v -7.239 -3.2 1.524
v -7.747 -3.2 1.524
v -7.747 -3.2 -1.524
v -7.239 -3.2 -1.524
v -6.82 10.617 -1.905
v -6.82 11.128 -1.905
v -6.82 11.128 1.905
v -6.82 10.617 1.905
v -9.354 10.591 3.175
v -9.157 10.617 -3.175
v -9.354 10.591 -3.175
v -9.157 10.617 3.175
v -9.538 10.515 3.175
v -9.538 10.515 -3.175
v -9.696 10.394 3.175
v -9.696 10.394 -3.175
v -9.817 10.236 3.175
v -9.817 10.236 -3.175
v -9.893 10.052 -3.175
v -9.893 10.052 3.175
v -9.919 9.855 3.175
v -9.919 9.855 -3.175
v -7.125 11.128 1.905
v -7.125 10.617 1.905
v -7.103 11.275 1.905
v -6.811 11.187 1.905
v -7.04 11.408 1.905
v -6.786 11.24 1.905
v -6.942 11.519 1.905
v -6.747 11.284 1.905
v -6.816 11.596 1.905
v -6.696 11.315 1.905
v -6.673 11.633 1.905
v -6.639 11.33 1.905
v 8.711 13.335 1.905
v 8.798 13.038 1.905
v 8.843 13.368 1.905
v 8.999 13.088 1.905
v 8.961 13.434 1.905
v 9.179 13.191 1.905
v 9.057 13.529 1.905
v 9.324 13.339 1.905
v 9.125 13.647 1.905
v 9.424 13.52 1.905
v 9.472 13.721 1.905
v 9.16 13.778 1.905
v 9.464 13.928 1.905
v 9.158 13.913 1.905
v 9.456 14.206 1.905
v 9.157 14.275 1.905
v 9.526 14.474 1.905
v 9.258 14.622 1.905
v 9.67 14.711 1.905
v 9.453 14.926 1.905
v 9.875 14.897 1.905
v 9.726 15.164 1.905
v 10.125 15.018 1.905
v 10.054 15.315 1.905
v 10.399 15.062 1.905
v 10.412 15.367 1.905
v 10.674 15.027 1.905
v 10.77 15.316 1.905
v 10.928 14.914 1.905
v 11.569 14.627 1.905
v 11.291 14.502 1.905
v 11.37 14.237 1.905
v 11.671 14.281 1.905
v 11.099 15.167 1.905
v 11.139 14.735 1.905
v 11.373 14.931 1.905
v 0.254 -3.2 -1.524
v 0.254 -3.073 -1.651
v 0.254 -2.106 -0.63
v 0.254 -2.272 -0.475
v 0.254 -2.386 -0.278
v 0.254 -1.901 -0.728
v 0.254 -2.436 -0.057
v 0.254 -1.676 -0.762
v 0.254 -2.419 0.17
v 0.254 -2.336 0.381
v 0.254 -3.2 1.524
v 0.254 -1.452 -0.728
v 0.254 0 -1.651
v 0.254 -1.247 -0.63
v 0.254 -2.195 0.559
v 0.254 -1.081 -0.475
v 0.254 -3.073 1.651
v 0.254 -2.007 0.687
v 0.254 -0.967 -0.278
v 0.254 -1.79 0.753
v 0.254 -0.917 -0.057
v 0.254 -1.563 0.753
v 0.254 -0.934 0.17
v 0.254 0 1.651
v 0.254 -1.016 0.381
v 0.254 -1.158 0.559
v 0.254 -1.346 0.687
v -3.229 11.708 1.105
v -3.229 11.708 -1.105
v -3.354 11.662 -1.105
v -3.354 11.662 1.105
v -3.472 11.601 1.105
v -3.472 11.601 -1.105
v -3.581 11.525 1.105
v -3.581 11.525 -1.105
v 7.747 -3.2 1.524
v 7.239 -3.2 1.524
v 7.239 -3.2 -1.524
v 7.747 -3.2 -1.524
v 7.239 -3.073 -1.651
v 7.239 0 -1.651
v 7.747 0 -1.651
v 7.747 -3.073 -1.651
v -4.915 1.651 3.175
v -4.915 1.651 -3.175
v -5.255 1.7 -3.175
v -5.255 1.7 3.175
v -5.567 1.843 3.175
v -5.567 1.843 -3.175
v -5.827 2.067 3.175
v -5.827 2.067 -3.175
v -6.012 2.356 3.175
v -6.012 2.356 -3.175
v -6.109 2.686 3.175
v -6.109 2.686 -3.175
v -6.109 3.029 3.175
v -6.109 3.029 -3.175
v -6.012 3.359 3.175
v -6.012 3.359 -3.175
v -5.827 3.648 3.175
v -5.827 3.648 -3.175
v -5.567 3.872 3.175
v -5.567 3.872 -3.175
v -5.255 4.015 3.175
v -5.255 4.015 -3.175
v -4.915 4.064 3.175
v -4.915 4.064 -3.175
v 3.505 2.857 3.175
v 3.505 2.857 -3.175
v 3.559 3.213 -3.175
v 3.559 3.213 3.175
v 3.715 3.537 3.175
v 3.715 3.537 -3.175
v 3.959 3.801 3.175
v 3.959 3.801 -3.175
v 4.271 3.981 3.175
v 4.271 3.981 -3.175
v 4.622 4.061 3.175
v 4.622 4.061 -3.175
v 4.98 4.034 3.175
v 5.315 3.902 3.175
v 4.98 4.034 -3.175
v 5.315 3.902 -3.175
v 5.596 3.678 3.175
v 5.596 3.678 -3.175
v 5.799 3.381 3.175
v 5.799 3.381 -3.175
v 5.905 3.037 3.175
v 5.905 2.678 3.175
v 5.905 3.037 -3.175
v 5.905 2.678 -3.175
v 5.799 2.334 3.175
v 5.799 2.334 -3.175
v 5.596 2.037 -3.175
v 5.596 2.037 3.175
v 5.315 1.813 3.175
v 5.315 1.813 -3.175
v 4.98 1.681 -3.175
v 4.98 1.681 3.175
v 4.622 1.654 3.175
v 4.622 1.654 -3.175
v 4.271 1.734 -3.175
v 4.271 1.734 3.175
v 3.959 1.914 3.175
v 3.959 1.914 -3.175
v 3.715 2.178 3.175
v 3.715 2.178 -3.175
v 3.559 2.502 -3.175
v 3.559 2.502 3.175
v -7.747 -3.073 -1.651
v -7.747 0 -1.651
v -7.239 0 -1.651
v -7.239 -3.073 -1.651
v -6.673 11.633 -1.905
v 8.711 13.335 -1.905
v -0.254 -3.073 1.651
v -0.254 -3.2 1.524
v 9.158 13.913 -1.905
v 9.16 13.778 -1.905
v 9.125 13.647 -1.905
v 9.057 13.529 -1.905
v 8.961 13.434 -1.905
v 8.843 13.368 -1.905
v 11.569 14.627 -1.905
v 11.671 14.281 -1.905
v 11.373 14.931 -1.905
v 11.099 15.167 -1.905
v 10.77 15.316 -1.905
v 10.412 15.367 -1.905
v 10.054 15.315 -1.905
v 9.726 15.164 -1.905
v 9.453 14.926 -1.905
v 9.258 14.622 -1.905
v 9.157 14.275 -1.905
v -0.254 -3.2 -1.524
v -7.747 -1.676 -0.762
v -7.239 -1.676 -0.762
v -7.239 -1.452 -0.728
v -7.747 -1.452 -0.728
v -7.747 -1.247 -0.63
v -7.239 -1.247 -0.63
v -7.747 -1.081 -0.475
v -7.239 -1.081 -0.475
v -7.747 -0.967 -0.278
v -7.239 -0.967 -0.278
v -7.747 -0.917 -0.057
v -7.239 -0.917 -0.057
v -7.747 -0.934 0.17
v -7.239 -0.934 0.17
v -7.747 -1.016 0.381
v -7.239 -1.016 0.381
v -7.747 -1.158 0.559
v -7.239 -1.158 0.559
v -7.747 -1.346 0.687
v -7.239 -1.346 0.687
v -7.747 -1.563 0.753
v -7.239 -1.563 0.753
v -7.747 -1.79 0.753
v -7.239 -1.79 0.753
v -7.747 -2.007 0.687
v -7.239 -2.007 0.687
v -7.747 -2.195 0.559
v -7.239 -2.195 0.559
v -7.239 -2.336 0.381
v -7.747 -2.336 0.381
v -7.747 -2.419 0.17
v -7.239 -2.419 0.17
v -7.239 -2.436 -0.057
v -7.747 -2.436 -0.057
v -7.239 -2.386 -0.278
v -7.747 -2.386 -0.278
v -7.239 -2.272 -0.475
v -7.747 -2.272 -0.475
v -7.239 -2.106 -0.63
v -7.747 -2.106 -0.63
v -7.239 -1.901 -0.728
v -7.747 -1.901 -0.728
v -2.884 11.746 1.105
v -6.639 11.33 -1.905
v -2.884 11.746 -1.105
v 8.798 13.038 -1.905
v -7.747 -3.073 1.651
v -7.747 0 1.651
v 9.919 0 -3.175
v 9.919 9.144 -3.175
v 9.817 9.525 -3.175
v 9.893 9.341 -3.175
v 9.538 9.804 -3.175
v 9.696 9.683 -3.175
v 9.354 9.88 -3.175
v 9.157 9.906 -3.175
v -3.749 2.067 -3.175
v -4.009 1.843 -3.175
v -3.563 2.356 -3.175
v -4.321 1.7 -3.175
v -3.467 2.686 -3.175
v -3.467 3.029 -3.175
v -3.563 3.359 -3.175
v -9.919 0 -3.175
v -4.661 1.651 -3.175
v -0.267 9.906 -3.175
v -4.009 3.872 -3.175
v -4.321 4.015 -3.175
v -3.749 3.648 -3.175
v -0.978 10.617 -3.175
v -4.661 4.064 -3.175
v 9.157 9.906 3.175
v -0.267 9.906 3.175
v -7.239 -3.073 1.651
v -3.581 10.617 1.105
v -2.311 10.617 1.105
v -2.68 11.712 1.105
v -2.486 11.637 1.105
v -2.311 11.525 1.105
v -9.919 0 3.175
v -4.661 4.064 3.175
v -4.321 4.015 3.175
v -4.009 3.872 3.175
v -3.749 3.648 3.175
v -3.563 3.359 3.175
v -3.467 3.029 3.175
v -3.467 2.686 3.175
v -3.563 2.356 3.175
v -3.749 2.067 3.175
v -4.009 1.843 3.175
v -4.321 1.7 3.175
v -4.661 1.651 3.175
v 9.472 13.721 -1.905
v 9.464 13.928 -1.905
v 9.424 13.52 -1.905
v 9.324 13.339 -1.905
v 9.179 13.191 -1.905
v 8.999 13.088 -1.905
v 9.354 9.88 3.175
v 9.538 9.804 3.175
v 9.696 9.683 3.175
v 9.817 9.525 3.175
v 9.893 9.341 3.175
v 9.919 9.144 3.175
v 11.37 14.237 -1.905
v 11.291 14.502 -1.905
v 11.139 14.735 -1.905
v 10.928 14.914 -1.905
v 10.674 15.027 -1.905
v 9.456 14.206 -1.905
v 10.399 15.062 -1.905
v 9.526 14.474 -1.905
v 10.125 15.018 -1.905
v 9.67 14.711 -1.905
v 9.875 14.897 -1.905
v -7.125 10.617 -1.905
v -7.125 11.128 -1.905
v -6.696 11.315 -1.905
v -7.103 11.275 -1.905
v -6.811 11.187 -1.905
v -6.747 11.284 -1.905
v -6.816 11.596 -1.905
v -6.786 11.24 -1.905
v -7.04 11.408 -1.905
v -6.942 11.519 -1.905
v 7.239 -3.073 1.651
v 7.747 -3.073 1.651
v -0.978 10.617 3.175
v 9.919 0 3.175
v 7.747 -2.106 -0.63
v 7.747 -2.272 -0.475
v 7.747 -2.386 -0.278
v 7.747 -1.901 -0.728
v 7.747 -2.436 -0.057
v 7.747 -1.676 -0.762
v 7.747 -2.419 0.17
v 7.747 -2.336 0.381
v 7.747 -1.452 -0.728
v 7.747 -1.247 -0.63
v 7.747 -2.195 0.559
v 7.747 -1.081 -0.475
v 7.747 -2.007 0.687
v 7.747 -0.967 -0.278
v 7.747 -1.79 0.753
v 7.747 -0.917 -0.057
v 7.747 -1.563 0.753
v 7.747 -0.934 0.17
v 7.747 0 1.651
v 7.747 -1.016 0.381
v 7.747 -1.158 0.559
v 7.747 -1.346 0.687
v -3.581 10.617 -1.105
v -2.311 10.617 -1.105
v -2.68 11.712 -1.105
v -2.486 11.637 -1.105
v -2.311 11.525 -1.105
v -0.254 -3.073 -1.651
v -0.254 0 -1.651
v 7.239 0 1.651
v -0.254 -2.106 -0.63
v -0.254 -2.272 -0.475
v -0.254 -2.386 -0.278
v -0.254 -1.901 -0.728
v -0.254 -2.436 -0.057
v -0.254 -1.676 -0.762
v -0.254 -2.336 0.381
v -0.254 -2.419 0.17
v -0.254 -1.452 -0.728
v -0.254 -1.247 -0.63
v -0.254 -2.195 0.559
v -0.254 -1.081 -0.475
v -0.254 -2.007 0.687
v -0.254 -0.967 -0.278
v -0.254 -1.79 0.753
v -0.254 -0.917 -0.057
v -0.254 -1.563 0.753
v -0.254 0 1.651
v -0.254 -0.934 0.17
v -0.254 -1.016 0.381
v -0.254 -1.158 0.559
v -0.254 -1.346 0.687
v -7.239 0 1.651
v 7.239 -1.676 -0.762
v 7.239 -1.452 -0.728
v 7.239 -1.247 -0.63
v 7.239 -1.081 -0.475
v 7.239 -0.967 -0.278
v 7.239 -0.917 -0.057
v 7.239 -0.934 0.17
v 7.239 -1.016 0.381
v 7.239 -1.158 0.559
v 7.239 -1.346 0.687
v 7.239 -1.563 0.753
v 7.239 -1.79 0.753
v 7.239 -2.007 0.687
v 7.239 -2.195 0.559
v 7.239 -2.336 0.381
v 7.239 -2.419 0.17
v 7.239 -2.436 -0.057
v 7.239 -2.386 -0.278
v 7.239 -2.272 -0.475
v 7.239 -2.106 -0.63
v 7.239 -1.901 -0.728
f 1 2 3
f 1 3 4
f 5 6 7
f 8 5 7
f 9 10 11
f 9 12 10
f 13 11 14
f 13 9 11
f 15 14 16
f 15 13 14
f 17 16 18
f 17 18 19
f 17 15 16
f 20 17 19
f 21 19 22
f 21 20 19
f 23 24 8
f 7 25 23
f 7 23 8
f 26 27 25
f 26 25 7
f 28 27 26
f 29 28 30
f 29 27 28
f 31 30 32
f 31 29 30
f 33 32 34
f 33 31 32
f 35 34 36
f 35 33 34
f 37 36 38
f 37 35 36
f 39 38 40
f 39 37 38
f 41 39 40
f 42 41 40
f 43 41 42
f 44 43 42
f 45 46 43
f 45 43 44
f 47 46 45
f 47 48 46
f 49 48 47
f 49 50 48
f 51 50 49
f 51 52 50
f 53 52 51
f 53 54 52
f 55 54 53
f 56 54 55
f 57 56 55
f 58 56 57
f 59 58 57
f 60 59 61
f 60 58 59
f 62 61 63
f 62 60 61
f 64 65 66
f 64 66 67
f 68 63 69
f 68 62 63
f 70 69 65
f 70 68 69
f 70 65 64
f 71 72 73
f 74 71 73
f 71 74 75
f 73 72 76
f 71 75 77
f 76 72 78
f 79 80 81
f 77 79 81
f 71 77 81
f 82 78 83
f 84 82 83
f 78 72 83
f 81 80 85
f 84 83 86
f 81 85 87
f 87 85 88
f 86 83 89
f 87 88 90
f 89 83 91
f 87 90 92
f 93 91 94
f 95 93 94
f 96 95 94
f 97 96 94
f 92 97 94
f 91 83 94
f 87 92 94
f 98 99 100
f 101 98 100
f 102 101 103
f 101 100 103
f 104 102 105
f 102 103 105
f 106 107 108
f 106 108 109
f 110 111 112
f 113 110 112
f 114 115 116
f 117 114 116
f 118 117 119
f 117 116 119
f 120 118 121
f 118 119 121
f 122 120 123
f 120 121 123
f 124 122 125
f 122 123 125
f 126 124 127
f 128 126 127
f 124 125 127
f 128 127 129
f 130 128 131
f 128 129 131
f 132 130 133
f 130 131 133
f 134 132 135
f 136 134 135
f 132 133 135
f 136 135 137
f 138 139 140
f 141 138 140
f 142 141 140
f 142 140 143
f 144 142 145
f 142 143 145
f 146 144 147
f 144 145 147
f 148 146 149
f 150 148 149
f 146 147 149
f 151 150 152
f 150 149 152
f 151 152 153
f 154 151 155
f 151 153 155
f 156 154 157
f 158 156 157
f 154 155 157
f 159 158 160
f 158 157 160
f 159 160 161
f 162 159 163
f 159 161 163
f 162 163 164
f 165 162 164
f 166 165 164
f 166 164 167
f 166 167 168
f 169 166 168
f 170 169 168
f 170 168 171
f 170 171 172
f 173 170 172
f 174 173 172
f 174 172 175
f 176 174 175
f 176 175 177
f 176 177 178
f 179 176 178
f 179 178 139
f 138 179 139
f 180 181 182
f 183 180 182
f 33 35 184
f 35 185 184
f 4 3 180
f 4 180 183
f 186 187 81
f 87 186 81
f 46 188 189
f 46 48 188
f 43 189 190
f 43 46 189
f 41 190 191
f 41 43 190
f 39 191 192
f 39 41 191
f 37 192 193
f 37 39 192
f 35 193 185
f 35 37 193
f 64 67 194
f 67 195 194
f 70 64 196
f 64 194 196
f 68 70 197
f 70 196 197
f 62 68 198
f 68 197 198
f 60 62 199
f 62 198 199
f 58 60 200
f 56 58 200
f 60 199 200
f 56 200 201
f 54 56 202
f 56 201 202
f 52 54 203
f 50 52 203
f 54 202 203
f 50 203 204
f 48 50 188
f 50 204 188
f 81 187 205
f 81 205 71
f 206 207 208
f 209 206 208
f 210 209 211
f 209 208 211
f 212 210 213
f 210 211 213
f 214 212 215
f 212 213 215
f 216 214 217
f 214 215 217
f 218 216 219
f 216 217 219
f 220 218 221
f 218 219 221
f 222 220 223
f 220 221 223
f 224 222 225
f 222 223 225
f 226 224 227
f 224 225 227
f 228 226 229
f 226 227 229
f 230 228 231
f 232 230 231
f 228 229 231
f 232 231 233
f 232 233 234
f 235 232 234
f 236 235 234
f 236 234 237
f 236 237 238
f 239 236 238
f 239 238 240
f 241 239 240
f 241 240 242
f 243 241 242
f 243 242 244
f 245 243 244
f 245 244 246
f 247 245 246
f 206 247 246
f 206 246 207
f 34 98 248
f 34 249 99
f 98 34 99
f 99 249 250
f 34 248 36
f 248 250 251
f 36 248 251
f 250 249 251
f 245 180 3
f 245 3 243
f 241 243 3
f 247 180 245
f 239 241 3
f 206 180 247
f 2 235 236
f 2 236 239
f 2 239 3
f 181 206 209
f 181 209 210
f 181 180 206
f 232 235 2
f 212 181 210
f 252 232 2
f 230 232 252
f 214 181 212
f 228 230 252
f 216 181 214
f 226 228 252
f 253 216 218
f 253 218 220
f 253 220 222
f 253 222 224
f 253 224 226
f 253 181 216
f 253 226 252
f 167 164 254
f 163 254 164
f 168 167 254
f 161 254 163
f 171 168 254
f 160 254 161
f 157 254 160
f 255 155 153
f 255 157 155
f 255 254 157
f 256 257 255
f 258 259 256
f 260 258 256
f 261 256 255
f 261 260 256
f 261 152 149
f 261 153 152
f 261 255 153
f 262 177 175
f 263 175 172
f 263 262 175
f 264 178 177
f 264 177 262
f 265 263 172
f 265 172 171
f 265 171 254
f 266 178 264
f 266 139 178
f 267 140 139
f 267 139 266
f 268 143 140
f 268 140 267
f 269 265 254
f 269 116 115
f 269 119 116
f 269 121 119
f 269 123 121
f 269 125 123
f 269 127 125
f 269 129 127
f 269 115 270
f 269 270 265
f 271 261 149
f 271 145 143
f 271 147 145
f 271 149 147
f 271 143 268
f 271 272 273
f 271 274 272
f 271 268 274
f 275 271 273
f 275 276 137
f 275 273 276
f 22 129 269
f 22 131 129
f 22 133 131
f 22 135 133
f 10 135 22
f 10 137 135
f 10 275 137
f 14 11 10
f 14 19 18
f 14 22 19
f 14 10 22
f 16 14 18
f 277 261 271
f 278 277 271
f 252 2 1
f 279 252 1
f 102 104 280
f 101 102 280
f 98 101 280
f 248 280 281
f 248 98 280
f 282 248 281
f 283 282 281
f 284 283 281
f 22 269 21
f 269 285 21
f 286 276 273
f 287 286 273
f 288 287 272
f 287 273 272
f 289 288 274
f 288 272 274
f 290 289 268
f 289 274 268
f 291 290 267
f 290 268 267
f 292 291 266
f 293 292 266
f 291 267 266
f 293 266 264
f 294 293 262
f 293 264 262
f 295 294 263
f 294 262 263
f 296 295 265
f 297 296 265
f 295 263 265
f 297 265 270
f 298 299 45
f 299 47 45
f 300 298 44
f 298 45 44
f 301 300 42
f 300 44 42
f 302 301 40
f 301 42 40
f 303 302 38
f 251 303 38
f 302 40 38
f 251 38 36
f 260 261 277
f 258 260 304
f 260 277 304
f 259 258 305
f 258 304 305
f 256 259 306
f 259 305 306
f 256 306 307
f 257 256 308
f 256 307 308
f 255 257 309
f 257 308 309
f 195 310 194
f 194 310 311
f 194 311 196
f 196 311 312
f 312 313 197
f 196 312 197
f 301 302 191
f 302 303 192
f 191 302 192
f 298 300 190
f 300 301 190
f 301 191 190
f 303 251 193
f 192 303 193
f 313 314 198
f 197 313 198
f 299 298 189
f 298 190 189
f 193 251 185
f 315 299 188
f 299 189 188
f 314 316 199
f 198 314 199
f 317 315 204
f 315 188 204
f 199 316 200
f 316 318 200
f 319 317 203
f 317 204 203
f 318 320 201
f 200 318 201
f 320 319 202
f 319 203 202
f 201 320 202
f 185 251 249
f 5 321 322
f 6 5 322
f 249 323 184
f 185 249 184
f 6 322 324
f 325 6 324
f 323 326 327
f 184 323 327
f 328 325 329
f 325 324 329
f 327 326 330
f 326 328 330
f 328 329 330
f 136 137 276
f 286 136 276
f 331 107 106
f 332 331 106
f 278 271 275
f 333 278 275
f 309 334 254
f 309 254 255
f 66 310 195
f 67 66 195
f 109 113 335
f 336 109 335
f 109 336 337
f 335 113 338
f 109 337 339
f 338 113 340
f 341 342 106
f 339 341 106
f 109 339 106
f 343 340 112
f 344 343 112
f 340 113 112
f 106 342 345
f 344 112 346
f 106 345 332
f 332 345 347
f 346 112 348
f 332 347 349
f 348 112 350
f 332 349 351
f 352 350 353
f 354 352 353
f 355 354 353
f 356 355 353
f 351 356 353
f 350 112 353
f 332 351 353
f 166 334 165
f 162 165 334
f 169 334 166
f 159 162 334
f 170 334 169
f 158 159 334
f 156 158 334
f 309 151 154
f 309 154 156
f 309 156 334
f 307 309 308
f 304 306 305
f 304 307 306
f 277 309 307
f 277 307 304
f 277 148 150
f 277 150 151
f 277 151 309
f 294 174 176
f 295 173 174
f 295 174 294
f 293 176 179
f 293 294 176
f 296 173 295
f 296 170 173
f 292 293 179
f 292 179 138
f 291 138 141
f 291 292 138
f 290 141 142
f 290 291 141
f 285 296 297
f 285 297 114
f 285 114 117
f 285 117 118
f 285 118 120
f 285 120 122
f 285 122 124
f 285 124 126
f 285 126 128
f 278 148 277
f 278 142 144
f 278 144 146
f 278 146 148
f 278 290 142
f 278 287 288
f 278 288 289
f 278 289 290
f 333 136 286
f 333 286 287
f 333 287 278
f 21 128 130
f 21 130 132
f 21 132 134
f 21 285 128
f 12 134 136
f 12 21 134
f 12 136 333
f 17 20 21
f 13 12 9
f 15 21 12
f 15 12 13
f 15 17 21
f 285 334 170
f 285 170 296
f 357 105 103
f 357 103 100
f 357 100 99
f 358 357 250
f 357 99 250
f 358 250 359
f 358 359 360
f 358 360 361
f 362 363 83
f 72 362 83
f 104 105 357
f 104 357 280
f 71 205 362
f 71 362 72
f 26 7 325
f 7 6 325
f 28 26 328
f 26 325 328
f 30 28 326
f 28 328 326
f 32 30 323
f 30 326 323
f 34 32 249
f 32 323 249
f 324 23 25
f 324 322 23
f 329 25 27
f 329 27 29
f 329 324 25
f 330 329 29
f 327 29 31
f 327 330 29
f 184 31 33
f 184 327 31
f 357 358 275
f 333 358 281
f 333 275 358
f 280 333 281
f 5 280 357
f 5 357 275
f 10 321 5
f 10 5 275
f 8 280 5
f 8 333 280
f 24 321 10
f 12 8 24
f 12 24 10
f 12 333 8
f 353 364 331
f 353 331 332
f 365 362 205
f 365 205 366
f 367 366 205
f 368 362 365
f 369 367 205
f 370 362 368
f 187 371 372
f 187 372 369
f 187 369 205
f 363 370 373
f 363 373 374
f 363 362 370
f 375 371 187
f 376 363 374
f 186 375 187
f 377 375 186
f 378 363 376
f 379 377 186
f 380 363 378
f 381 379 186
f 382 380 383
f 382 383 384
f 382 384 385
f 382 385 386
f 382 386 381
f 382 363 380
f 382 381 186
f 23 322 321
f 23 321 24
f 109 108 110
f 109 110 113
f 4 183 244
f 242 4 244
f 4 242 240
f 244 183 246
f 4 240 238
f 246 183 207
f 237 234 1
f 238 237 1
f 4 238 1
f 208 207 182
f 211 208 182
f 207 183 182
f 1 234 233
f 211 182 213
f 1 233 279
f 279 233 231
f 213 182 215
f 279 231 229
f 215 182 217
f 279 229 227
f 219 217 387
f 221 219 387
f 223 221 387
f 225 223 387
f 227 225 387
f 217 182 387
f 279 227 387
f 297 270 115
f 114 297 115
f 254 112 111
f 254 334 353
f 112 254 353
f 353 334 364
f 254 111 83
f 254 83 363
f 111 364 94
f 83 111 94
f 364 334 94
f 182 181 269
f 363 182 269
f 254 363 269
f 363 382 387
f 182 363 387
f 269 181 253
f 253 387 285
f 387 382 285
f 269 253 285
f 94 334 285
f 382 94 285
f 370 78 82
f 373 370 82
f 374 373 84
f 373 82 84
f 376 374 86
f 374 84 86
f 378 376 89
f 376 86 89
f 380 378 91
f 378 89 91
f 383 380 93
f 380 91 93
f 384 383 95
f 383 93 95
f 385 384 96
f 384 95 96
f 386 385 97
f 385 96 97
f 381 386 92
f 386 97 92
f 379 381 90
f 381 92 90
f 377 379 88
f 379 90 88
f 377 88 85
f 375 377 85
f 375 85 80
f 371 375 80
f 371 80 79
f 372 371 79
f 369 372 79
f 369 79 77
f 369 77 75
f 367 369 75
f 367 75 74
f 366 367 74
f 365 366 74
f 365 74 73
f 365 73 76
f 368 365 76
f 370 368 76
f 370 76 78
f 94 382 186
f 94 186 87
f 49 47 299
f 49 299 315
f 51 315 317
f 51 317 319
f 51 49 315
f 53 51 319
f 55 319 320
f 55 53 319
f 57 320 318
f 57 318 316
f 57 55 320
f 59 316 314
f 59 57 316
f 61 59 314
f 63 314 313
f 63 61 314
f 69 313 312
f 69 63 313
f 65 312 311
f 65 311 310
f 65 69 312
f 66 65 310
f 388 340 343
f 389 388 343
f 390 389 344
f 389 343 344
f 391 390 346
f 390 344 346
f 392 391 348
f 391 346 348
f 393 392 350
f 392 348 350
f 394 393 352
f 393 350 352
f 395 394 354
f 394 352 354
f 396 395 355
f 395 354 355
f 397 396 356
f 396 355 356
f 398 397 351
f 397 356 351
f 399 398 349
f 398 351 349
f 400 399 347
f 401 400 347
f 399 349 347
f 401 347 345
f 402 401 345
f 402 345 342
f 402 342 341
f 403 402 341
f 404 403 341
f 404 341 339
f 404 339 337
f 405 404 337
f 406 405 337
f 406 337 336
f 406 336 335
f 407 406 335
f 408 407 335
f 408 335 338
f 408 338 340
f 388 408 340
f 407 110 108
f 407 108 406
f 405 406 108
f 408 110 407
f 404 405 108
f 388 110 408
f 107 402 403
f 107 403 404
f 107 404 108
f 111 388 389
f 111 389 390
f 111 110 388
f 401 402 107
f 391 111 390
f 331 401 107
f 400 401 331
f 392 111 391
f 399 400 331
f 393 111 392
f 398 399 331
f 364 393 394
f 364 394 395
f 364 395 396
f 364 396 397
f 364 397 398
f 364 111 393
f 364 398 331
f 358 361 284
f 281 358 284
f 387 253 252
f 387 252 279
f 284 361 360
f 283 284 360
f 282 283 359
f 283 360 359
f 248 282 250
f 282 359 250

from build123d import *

# Parameters (mm, degrees)
BOSS_EXTRUDE1_START   = -2.2098
BOSS_EXTRUDE1_DEPTH   = 3.0099
BOSS_EXTRUDE1_2_DEPTH = 2.2098
BOSS_EXTRUDE2_START   = 0.8001
BOSS_EXTRUDE2_DEPTH   = 0.8001
SKETCH3_W             = 1.27
SKETCH3_H             = 2.2098
BOSS_EXTRUDE3_DEPTH   = 0.907414746
SKETCH4_W             = 0.3048
SKETCH4_H             = 3.81
BOSS_EXTRUDE4_DEPTH   = 0.693040986
SKETCH5_W             = 7.6073
SKETCH5_H             = 5.08
BOSS_EXTRUDE5_DEPTH   = 10.6172
SKETCH6_W             = 5.08
SKETCH6_H             = 10.6172
BOSS_EXTRUDE6_DEPTH   = 12.2301
SKETCH7_W             = 19.8374
SKETCH7_H             = 10.6172
BOSS_EXTRUDE7_DEPTH   = 1.27
SKETCH8_W             = 10.8966
SKETCH8_H             = 0.7112
CUT_EXTRUDE1_DEPTH    = 21.314685149
CUT_EXTRUDE2_DEPTH    = 21.314685149
SKETCH10_W            = 0.508
SKETCH10_H            = 3.302
BOSS_EXTRUDE8_DEPTH   = 3.2004
SKETCH11_W            = 0.508
SKETCH11_H            = 3.302
BOSS_EXTRUDE9_DEPTH   = 3.2004
SKETCH12_W            = 0.508
SKETCH12_H            = 3.302
BOSS_EXTRUDE10_DEPTH  = 3.2004
DRAFT1_ANGLE          = 45
SKETCH13_W            = 0.9652
SKETCH13_H            = 3.81
M2_CLEARANCE_HOLE1_D  = 2.413
HOLE1_D               = 1.524
HOLE1_DEPTH           = 4.4323
HOLE2_D               = 1.524
HOLE2_DEPTH           = 0.508
HOLE3_D               = 1.524
HOLE3_DEPTH           = 11.9253
CHAMFER1_SIZE         = 0.127
FILLET1_R             = 0.2032
FILLET2_R             = 0.508
FILLET3_R             = 0.762


with BuildPart() as part:
    # Boss-Extrude1: read off the stored shape, not the designer's step
    # Boss-Extrude1 outline → Boss-Extrude1 (new body)
    with BuildSketch(Plane.XY.offset(1.1049).offset(BOSS_EXTRUDE1_START)):
        with BuildLine():
            ThreePointArc((10.105641195, 13.182599991), (11.032749783, 13.355678114), (11.369702921, 14.236557762))
            Line((11.369702921, 14.236557762), (11.6713, 14.280628634))
            ThreePointArc((11.6713, 14.280628634), (9.96678948, 15.2854128), (9.349347434, 13.405595614))
            Line((9.349347434, 13.405595614), (-7.1247, 11.583182333))
            Line((-7.1247, 11.583182333), (-7.1247, 11.310240986))
            Line((-7.1247, 11.310240986), (-6.8199, 11.310240986))
            Line((-6.8199, 11.310240986), (10.105641195, 13.182599991))
        make_face()
    extrude(amount=BOSS_EXTRUDE1_DEPTH)

    # Boss-Extrude1 2 outline → Boss-Extrude1 2 (add)
    with BuildSketch(Plane.XY.offset(1.1049).offset(BOSS_EXTRUDE1_START)):
        with BuildLine():
            ThreePointArc((-2.3114, 11.524614746), (-2.580781823, 11.679434254), (-2.884355928, 11.745603808))
            Line((-2.884355928, 11.745603808), (-3.228598394, 11.707522575))
            ThreePointArc((-3.228598394, 11.707522575), (-3.414029171, 11.633486118), (-3.5814, 11.524614746))
            Line((-3.5814, 11.524614746), (-2.3114, 11.524614746))
        make_face()
    extrude(amount=BOSS_EXTRUDE1_2_DEPTH)

    # Sketch2 → Boss-Extrude2 (add)
    with BuildSketch(Plane(origin=(0, 0, -1.1049), x_dir=(-1, 0, 0), z_dir=(0, 0, -1)).offset(BOSS_EXTRUDE2_START)):
        with BuildLine():
            Line((6.8199, 11.310240986), (-10.105641195, 13.182599991))
            ThreePointArc((-10.105641195, 13.182599991), (-11.032749783, 13.355678114), (-11.369702921, 14.236557762))
            Line((-11.369702921, 14.236557762), (-11.6713, 14.280628634))
            ThreePointArc((-11.6713, 14.280628634), (-9.96678948, 15.2854128), (-9.349347434, 13.405595614))
            Line((-9.349347434, 13.405595614), (7.1247, 11.583182333))
            Line((7.1247, 11.583182333), (7.1247, 11.310240986))
            Line((7.1247, 11.310240986), (6.8199, 11.310240986))
        make_face()
    extrude(amount=-BOSS_EXTRUDE2_DEPTH)

    # Sketch3 → Boss-Extrude3 (add)
    with BuildSketch(Plane.XZ.offset(-11.524614746)):
        with Locations((-2.9464, 0)):
            Rectangle(SKETCH3_W, SKETCH3_H)
    extrude(amount=BOSS_EXTRUDE3_DEPTH)

    # Sketch4 → Boss-Extrude4 (add)
    with BuildSketch(Plane.XZ.offset(-11.310240986)):
        with Locations((-6.9723, 0)):
            Rectangle(SKETCH4_W, SKETCH4_H)
    extrude(amount=BOSS_EXTRUDE4_DEPTH)

    # Sketch5 → Boss-Extrude5 (add)
    with BuildSketch(Plane.XZ.offset(-10.6172)):
        with Locations((-6.11505, 0.635)):
            Rectangle(SKETCH5_W, SKETCH5_H)
    extrude(amount=BOSS_EXTRUDE5_DEPTH)

    # Sketch6 → Boss-Extrude6 (add)
    with BuildSketch(Plane(origin=(-2.3114, 0, 0), x_dir=(0, 0, -1), z_dir=(1, 0, 0))):
        with Locations((-0.635, 5.3086)):
            Rectangle(SKETCH6_W, SKETCH6_H)
    extrude(amount=BOSS_EXTRUDE6_DEPTH)

    # Sketch7 → Boss-Extrude7 (add)
    with BuildSketch(Plane(origin=(0, 0, -1.905), x_dir=(-1, 0, 0), z_dir=(0, 0, -1))):
        with Locations((0, 5.3086)):
            Rectangle(SKETCH7_W, SKETCH7_H)
    extrude(amount=BOSS_EXTRUDE7_DEPTH)

    # Sketch8 → Cut-Extrude1 (cut, through all)
    with BuildSketch(Plane(origin=(0, 0, -3.175), x_dir=(-1, 0, 0), z_dir=(0, 0, -1))):
        with Locations((-4.4704, 10.2616)):
            Rectangle(SKETCH8_W, SKETCH8_H)
    extrude(amount=-CUT_EXTRUDE1_DEPTH, mode=Mode.SUBTRACT)

    # Sketch9 → Cut-Extrude2 (cut, through all)
    with BuildSketch(Plane(origin=(0, 0, -3.175), x_dir=(-1, 0, 0), z_dir=(0, 0, -1))):
        with BuildLine():
            Line((4.9149, 4.064), (4.6609, 4.064))
            ThreePointArc((4.6609, 4.064), (3.4544, 2.8575), (4.6609, 1.651))
            Line((4.6609, 1.651), (4.9149, 1.651))
            ThreePointArc((4.9149, 1.651), (6.1214, 2.8575), (4.9149, 4.064))
        make_face()
    extrude(amount=-CUT_EXTRUDE2_DEPTH, mode=Mode.SUBTRACT)

    # Sketch10 → Boss-Extrude8 (add)
    with BuildSketch(Plane.XZ):
        Rectangle(SKETCH10_W, SKETCH10_H)
    extrude(amount=BOSS_EXTRUDE8_DEPTH)

    # Sketch11 → Boss-Extrude9 (add)
    with BuildSketch(Plane.XZ):
        with Locations((-7.493, 0)):
            Rectangle(SKETCH11_W, SKETCH11_H)
    extrude(amount=BOSS_EXTRUDE9_DEPTH)

    # Sketch12 → Boss-Extrude10 (add)
    with BuildSketch(Plane.XZ):
        with Locations((7.493, 0)):
            Rectangle(SKETCH12_W, SKETCH12_H)
    extrude(amount=BOSS_EXTRUDE10_DEPTH)

    # Draft1
    draft1_faces = [part.faces().sort_by_distance(p)[0] for p in [
        (-0.9779, 10.2616, 0),
    ]]
    draft(draft1_faces, Plane(origin=(0, 10.6172, 0), x_dir=(1, 0, 0), z_dir=(0, 1, 0)), DRAFT1_ANGLE)

    # Sketch13 → Cut-Revolve1 (revolve, cut)
    with BuildSketch(Plane.XZ.offset(-14.097)):
        with Locations((10.897245503, 0)):
            Rectangle(SKETCH13_W, SKETCH13_H)
    revolve(axis=Axis((10.414645503, 14.097, 1.905), (0, 0, -1)), mode=Mode.SUBTRACT)

    # M2 Clearance Hole1 (through all)
    with Locations(Plane.XY.offset(3.175)):
        with Locations((4.7117, 2.8575)):
            Hole(M2_CLEARANCE_HOLE1_D / 2)

    # Hole1
    with Locations(Plane.ZY.offset(-7.239)):
        with Locations((0, -1.6764)):
            Hole(HOLE1_D / 2, depth=HOLE1_DEPTH)

    # Hole2
    with Locations(Plane.ZY.offset(7.747)):
        with Locations((0, -1.6764)):
            Hole(HOLE2_D / 2, depth=HOLE2_DEPTH)

    # Hole3
    with Locations(Plane.ZY.offset(0.254)):
        with Locations((0, -1.6764)):
            Hole(HOLE3_D / 2, depth=HOLE3_DEPTH)

    # Chamfer1
    chamfer1_edges = [part.edges().sort_by_distance(p)[0] for p in [
        (0, -3.2004, -1.651),
        (0, -3.2004, 1.651),
        (-7.493, -3.2004, -1.651),
        (-7.493, -3.2004, 1.651),
        (7.493, -3.2004, -1.651),
        (7.493, -3.2004, 1.651),
    ]]
    chamfer(chamfer1_edges, length=CHAMFER1_SIZE)

    # Fillet1
    fillet1_edges = [part.edges().sort_by_distance(p)[0] for p in [
        (-6.8199, 11.310240986, 0.40005),
    ]]
    fillet(fillet1_edges, radius=FILLET1_R)

    # Fillet2
    fillet2_edges = [part.edges().sort_by_distance(p)[0] for p in [
        (-7.1247, 11.583182333, 0.40005),
        (9.349347434, 13.405595614, 0.40005),
    ]]
    fillet(fillet2_edges, radius=FILLET2_R)

    # Fillet3
    fillet3_edges = [part.edges().sort_by_distance(p)[0] for p in [
        (10.105641195, 13.182599991, 0.40005),
        (-9.9187, 10.6172, 0),
        (9.9187, 9.906, 0),
    ]]
    fillet(fillet3_edges, radius=FILLET3_R)


solid = part.part
